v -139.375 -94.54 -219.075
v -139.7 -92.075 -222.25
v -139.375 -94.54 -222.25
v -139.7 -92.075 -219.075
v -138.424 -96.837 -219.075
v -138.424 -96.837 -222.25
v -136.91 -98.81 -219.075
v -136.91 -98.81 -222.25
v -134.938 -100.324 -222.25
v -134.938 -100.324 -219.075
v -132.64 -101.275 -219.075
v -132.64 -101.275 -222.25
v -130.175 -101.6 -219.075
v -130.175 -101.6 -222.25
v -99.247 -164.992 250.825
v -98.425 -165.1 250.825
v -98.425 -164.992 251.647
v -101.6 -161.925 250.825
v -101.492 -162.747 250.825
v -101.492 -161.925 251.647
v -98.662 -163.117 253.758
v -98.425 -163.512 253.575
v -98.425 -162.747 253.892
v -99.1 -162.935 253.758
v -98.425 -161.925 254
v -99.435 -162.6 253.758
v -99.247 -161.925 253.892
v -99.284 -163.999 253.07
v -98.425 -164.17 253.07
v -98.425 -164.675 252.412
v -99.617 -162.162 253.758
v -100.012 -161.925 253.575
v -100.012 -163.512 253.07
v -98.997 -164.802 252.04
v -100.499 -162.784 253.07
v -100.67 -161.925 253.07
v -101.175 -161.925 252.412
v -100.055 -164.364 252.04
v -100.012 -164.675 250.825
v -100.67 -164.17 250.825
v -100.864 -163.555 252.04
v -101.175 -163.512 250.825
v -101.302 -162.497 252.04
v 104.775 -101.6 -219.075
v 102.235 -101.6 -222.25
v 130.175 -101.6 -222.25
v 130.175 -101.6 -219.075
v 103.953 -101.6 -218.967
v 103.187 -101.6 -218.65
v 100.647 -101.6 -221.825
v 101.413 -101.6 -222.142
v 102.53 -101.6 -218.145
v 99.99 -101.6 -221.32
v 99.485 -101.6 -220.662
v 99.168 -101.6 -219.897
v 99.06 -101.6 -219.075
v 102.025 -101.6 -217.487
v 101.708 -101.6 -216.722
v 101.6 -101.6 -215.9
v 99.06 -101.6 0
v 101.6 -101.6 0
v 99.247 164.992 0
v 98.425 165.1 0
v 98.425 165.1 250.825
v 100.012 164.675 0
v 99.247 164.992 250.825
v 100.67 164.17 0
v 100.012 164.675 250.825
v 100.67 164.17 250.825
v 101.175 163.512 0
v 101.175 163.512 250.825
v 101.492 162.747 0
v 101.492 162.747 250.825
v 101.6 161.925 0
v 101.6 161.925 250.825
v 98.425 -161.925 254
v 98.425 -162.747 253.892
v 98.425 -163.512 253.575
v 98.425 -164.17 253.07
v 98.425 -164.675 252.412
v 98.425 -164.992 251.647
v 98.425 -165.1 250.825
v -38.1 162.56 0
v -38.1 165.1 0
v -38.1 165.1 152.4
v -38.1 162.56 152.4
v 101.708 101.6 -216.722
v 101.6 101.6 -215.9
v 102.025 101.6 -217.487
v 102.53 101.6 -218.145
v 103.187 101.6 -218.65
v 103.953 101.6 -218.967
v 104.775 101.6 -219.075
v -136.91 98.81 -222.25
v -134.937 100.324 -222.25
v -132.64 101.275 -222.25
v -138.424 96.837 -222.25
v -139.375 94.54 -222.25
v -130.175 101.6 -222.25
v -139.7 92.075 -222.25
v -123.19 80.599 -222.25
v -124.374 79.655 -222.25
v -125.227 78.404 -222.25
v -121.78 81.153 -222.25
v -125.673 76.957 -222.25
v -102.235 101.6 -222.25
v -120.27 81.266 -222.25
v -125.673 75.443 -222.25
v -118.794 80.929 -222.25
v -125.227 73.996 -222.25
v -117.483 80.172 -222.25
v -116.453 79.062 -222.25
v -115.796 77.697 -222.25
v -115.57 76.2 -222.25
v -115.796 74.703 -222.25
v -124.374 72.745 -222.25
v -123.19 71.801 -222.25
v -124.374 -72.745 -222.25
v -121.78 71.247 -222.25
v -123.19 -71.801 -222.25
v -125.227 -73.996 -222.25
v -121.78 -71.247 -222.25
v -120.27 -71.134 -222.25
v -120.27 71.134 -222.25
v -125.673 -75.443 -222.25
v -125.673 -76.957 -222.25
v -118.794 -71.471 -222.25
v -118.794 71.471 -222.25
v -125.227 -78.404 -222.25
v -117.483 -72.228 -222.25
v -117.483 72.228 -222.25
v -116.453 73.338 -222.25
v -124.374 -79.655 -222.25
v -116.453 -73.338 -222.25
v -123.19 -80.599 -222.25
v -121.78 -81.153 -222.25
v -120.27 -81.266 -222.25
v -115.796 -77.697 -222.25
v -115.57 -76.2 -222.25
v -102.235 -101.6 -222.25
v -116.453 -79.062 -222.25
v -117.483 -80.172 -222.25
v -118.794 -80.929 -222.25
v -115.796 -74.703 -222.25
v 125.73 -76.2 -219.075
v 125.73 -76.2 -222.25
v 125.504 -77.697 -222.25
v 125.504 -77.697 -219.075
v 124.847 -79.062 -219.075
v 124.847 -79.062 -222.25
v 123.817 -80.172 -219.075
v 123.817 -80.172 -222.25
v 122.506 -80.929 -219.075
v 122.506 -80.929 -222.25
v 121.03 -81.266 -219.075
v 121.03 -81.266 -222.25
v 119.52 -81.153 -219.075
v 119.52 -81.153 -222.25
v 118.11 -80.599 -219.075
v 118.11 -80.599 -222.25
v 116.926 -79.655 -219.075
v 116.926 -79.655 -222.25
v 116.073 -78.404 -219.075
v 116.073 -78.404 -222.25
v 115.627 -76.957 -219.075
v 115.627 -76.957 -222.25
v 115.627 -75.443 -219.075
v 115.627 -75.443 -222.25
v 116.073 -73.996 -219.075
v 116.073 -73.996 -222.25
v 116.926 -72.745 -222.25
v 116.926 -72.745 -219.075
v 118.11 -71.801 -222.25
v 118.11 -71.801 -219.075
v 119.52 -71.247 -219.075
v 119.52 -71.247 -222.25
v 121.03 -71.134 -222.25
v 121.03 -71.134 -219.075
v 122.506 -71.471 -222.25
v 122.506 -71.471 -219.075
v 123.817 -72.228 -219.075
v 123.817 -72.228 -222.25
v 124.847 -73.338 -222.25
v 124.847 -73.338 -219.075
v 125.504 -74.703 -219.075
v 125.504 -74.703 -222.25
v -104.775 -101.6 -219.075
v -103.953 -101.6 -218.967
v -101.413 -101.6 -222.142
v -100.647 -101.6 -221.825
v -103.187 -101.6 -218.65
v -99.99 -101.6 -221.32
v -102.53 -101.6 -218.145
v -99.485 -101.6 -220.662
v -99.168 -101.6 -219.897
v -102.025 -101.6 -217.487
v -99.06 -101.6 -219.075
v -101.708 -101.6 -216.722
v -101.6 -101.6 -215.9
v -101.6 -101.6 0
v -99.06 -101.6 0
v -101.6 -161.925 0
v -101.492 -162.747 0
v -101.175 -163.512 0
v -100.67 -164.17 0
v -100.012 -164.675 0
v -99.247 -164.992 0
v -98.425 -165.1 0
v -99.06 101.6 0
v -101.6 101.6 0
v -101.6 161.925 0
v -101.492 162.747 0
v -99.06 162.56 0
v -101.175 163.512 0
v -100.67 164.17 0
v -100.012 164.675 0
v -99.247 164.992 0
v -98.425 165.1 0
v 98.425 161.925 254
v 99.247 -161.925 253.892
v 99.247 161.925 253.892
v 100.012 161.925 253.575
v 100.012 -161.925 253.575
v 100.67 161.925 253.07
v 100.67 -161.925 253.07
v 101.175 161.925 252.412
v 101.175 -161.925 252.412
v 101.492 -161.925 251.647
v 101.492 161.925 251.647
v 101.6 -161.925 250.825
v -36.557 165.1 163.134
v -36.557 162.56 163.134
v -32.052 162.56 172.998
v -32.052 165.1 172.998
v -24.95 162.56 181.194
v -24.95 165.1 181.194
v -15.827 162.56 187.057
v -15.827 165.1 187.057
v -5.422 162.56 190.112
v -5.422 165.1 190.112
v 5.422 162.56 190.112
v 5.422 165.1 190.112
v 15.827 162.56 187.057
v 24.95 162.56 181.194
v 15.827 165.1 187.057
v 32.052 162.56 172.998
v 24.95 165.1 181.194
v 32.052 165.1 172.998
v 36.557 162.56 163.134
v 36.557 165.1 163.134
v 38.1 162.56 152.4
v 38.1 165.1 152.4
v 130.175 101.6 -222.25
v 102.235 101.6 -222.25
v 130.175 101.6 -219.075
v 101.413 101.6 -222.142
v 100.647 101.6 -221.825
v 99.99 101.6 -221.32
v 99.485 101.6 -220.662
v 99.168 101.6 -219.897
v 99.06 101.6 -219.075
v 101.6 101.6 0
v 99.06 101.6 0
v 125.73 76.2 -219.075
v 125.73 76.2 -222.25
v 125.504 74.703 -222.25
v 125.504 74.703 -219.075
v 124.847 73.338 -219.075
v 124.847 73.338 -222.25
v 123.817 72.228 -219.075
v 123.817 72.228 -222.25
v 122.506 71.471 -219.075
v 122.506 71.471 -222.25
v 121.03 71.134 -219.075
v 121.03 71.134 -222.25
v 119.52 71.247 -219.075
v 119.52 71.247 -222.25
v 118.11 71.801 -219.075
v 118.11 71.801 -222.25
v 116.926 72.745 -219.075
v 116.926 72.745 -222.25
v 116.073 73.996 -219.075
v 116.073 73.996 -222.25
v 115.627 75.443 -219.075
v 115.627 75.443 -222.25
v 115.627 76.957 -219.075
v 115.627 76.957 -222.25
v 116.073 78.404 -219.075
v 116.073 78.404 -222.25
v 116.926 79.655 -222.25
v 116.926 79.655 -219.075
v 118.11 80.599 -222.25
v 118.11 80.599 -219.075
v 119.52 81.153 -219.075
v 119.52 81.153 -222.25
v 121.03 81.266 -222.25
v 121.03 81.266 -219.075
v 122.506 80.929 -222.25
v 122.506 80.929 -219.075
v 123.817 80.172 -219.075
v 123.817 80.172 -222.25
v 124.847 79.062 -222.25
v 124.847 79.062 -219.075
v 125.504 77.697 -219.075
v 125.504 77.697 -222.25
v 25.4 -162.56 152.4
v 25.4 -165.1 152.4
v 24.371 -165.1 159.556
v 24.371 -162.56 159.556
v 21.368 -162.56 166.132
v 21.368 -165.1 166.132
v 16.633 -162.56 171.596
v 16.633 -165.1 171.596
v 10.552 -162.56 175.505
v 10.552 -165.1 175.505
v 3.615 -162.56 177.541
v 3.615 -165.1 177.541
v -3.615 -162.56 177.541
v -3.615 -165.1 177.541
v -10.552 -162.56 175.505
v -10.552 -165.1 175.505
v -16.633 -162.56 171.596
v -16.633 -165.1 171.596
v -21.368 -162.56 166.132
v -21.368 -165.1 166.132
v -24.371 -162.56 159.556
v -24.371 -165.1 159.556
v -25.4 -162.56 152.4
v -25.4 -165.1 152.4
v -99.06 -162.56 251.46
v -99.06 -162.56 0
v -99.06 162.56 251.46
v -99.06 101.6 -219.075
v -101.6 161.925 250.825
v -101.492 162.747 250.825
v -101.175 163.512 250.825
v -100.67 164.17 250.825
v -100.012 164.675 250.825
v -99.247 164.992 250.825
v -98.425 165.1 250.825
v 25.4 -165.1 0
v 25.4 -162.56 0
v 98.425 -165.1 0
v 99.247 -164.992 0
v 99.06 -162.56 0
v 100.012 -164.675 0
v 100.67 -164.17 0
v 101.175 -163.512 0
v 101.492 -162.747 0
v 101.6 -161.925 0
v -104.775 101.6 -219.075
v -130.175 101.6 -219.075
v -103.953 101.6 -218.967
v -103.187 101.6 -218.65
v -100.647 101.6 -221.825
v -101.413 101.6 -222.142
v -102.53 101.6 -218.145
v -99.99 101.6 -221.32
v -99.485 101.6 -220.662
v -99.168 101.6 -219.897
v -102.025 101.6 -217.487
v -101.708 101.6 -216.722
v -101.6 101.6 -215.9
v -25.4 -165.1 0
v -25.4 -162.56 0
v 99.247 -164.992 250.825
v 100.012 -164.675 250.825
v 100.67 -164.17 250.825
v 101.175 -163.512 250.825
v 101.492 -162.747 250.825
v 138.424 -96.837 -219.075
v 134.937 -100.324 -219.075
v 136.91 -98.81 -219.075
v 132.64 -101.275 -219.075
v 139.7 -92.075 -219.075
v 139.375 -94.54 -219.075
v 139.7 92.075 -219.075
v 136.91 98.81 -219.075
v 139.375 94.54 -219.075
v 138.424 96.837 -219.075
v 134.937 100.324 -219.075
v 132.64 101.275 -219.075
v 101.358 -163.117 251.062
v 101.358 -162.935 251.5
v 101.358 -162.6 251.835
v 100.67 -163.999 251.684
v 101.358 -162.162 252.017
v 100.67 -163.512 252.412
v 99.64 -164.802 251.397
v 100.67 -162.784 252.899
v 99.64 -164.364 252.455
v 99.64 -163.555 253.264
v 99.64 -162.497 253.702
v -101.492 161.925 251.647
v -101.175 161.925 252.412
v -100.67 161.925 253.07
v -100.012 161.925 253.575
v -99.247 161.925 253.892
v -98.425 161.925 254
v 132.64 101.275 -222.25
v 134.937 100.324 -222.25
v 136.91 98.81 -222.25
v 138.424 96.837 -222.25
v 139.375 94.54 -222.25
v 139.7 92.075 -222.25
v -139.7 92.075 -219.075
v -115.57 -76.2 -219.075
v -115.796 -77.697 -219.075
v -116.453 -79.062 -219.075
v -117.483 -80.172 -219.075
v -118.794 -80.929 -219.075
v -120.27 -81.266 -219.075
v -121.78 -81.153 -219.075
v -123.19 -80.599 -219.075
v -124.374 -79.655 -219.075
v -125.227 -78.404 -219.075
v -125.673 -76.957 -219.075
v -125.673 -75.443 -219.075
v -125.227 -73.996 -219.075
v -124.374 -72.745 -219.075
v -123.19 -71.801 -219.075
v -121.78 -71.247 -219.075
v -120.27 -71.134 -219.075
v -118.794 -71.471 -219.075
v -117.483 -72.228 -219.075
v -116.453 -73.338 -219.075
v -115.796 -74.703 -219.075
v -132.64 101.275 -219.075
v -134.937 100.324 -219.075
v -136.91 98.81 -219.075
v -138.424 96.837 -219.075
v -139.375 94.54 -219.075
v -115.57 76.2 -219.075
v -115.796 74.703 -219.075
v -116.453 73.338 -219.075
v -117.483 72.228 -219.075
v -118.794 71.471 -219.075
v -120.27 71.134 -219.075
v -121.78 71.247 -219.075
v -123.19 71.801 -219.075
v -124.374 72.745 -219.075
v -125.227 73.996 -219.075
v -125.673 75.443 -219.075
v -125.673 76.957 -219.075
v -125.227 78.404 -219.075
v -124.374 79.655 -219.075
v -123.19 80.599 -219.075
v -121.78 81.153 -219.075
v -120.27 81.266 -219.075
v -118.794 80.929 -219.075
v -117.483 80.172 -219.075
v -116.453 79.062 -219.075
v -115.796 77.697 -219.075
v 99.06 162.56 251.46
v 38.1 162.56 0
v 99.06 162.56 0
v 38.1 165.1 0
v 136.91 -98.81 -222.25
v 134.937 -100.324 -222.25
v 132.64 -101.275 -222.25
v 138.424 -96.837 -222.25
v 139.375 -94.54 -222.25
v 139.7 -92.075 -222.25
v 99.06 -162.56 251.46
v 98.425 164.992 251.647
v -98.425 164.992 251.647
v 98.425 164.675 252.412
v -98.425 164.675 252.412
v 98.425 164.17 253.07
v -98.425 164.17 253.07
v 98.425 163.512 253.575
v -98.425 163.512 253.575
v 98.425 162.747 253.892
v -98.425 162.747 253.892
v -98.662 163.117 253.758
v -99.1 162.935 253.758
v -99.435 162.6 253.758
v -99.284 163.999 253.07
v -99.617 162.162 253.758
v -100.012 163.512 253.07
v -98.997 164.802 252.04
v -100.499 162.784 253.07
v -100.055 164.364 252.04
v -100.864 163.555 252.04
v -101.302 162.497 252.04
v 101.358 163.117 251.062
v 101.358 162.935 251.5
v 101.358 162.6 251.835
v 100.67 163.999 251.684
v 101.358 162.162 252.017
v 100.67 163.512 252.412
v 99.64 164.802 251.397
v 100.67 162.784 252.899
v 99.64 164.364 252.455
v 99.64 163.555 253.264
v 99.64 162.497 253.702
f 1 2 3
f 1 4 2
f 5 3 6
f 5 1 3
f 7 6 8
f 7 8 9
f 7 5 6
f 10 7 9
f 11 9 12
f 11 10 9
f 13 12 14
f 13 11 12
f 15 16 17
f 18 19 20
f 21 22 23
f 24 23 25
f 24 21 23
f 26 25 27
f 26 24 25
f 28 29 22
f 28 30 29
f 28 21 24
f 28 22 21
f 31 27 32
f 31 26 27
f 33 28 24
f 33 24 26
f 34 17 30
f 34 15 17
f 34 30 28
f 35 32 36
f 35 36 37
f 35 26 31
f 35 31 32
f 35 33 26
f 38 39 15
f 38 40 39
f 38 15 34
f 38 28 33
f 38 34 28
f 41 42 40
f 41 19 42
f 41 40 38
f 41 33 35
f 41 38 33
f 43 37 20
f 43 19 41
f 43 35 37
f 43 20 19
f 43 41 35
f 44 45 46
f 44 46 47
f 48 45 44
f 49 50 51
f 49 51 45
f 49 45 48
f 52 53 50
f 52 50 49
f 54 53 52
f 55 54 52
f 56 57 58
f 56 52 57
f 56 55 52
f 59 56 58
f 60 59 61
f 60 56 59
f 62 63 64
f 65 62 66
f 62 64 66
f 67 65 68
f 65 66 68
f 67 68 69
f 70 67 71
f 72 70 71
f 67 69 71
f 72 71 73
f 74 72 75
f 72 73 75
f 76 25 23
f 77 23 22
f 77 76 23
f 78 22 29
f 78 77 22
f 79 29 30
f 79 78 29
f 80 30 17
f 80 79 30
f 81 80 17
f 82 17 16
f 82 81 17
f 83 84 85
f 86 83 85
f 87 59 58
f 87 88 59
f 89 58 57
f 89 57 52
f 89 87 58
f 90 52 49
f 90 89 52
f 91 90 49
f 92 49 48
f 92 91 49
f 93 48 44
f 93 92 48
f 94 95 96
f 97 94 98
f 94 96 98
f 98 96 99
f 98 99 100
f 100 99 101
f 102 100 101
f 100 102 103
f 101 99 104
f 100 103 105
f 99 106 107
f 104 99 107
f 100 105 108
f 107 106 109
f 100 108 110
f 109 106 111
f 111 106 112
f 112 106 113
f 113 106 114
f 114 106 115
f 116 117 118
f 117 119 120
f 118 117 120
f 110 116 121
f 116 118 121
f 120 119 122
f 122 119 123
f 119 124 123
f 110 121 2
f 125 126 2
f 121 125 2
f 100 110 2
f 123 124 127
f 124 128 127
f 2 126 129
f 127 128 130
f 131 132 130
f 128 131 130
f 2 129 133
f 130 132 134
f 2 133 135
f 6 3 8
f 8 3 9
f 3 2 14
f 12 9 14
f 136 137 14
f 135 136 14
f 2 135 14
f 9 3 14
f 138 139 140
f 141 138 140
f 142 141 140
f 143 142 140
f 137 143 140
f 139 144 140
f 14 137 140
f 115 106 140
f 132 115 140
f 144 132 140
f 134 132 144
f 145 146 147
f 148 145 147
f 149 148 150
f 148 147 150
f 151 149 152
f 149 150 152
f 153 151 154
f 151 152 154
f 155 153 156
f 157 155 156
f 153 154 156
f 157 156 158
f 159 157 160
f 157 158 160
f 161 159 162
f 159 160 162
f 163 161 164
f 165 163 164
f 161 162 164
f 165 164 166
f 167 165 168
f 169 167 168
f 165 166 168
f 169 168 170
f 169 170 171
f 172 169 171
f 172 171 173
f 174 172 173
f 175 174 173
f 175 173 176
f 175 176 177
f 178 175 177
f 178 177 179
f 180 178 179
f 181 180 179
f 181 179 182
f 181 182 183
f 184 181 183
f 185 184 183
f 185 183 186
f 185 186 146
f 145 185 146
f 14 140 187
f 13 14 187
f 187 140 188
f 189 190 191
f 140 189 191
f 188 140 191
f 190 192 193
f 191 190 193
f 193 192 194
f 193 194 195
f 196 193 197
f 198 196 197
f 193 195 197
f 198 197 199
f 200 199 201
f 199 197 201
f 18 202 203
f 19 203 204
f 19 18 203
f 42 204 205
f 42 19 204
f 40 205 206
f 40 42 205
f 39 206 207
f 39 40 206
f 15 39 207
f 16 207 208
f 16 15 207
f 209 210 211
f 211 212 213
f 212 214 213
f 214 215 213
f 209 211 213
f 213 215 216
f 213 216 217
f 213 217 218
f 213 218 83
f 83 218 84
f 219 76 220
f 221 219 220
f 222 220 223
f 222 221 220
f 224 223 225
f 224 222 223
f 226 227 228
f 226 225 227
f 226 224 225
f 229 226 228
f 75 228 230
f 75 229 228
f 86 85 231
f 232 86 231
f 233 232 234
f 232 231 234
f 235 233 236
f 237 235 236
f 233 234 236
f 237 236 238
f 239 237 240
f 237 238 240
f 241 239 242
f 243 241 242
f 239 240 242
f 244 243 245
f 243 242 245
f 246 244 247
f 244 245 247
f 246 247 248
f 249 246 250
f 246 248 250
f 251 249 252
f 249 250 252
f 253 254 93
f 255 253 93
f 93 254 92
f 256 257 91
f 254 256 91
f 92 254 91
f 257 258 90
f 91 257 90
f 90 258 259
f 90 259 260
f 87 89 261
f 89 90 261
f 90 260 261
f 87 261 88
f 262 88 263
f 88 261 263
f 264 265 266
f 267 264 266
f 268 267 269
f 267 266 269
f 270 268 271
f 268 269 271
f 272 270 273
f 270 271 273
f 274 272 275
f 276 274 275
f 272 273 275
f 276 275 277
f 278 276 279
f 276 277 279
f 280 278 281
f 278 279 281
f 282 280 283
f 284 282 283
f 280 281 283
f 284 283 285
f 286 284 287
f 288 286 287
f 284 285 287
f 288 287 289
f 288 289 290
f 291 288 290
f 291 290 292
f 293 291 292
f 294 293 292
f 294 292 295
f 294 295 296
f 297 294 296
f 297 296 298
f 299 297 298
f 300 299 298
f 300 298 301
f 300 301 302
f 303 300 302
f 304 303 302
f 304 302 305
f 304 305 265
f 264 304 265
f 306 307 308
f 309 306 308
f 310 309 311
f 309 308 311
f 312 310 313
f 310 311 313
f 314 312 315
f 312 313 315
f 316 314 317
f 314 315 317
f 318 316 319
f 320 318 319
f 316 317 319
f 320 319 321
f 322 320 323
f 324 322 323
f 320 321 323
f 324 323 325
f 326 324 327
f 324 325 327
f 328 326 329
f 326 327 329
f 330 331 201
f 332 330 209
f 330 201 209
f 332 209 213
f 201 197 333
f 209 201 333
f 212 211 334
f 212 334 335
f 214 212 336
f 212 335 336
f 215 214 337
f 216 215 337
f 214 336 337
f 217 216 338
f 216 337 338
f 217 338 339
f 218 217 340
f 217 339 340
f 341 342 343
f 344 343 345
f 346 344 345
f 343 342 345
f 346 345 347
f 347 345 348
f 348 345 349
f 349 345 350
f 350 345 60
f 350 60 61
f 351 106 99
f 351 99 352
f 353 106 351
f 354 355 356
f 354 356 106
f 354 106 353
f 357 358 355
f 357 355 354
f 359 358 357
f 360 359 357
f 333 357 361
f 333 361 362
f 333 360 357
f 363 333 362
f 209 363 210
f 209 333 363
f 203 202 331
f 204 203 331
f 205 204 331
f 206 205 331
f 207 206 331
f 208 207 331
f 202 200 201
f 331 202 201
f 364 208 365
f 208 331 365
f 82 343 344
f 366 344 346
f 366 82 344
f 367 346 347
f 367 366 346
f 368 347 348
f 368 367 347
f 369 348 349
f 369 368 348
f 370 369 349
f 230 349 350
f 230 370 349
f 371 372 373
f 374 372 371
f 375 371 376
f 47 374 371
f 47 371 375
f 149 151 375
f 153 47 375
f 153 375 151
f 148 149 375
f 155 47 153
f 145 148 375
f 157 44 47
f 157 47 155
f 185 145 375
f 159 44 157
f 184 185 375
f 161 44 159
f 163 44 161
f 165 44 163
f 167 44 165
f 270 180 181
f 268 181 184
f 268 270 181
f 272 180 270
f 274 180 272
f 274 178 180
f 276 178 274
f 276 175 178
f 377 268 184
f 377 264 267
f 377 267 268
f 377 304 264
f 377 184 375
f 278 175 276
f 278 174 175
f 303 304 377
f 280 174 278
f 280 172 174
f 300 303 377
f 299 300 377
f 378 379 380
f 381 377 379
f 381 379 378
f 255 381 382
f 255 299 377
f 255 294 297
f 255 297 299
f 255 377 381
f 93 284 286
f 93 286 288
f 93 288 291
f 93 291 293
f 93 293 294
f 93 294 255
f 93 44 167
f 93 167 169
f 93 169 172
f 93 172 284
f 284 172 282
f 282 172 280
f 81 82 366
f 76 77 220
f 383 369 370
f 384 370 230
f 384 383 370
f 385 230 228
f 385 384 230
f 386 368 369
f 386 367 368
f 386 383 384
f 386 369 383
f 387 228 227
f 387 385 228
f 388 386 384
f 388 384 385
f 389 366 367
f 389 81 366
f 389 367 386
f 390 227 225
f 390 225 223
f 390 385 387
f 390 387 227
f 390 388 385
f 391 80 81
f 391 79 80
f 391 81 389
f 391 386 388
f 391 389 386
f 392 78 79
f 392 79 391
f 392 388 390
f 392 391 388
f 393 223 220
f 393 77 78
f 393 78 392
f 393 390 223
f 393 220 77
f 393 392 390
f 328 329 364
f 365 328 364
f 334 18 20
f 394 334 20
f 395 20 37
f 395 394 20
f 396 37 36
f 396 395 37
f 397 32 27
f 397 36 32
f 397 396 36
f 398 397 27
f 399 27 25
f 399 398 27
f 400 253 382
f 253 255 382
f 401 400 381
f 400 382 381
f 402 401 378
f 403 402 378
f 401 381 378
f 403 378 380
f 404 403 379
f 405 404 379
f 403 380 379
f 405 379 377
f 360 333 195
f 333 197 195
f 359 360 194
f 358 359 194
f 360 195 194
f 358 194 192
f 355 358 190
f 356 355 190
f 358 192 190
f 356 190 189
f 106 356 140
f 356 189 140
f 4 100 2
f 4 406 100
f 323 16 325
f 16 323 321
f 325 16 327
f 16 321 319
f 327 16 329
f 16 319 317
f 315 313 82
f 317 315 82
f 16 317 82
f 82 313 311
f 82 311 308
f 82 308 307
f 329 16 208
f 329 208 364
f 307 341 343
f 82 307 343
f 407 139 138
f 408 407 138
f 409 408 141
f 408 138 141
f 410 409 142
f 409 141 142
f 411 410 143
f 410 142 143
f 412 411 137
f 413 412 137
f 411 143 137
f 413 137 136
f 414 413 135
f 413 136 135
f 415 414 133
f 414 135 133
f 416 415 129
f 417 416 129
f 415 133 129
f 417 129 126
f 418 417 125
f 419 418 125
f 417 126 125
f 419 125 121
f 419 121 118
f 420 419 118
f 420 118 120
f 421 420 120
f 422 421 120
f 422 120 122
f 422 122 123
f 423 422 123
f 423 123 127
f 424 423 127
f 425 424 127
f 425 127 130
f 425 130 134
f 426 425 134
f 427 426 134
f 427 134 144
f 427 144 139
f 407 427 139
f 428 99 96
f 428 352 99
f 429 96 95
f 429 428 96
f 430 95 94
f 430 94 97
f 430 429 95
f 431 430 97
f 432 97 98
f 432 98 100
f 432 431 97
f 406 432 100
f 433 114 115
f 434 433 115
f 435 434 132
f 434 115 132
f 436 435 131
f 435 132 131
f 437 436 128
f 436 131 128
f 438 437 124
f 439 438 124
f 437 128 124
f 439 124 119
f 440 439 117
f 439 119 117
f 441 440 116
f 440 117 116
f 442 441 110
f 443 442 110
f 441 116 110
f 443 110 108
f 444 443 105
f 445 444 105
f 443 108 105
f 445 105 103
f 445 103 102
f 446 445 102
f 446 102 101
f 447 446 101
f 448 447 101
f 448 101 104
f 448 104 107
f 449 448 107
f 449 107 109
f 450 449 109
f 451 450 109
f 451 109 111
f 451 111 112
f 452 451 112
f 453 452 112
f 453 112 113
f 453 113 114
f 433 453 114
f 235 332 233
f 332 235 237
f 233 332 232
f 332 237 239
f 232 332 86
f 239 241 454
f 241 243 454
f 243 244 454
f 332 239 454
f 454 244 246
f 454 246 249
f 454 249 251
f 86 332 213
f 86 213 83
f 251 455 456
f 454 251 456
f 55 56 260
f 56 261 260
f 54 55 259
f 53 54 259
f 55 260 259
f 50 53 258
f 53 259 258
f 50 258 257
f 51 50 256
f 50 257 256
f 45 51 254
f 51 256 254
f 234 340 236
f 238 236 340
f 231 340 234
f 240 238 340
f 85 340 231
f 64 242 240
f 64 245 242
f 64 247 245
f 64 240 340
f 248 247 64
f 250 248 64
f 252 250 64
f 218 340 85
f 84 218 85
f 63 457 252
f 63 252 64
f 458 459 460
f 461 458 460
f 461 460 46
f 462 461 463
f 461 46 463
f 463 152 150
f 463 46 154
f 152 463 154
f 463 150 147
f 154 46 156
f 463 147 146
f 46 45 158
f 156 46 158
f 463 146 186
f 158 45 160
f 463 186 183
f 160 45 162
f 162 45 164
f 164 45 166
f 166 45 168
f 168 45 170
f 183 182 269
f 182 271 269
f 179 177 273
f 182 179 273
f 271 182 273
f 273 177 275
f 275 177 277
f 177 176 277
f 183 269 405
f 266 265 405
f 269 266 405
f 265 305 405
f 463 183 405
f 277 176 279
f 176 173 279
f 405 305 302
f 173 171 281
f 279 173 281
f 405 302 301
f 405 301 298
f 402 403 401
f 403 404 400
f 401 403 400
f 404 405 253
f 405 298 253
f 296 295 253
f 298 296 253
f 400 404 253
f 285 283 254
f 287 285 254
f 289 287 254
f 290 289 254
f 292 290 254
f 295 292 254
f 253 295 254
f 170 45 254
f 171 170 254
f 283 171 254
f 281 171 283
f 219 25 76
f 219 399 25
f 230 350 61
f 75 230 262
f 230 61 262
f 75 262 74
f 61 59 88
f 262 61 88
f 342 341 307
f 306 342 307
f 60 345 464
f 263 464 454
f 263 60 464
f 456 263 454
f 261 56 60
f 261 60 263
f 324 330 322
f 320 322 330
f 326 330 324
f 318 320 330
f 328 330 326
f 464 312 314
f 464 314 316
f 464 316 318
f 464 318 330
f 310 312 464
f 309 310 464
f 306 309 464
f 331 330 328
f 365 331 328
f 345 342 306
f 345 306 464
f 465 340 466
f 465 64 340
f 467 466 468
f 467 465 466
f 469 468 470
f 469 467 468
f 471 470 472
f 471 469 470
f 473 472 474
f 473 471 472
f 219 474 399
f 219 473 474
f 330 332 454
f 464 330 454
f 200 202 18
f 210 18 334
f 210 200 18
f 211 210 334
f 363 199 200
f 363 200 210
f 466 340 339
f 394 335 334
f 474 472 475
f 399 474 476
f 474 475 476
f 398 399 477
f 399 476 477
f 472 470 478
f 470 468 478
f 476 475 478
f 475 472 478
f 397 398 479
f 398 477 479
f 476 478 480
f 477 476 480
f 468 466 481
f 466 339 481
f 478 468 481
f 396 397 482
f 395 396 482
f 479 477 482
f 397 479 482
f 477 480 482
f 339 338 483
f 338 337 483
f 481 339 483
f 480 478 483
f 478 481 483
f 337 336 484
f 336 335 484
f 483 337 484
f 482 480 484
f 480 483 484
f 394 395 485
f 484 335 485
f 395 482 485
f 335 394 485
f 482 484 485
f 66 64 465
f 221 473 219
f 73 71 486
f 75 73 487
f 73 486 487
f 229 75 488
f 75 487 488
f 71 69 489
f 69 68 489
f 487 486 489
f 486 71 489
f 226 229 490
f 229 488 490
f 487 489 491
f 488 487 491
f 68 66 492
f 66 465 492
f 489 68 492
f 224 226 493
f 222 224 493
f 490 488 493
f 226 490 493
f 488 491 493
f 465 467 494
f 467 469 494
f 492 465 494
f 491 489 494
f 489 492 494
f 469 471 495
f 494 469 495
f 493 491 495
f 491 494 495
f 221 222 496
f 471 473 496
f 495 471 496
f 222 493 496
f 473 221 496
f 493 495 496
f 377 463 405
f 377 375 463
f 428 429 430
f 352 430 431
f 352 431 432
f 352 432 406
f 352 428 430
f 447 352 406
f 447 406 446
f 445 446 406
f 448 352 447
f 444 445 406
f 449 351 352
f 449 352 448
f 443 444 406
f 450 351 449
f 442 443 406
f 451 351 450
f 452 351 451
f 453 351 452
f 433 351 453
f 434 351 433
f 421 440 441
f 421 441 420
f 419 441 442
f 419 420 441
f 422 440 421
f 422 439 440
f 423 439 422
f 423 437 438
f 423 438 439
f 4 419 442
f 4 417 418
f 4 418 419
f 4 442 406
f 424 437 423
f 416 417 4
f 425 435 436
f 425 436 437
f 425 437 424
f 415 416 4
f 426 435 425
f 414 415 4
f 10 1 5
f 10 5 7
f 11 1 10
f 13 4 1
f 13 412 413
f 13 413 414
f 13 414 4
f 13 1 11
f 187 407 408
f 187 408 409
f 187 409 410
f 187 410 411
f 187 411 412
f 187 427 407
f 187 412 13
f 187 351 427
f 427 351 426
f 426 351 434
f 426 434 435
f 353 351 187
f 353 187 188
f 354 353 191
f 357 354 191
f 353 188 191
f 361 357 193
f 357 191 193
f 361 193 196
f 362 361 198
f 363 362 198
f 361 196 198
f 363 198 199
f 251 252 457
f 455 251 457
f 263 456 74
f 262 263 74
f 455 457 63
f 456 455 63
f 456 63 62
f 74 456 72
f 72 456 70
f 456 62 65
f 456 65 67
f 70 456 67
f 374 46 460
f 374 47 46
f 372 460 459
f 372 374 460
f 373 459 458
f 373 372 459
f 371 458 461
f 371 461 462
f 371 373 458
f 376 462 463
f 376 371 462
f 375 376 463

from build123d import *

# Parameters (mm, degrees)
F0_W      = 203.2
F0_H      = 330.2
F1_DEPTH  = 254
F2_T      = -2.54
F4_DEPTH  = 25.4
F6_DEPTH  = 25.4
F8_DEPTH  = 222.25
F10_DEPTH = 222.25
F11_W     = 203.2
F11_H     = 3.175
F12_DEPTH = 38.1
F13_W     = 203.2
F13_H     = 3.175
F14_DEPTH = 38.1
F15_R     = 5.08
F16_DEPTH = 25.4
F17_R     = 3.175
F18_R     = 9.525


with BuildPart() as f1:
    # F0 (on Top) → F1 (new body)
    with BuildSketch(Plane.XY):
        Rectangle(F0_W, F0_H)
    extrude(amount=F1_DEPTH)

    # F2
    f2_openings = [f1.faces().sort_by_distance(p)[0] for p in [
        (0, 0, 0),
    ]]
    offset(amount=F2_T, openings=f2_openings)

    # F3 (on face) → F4 (cut)
    with BuildSketch(Plane.XZ.offset(165.1)):
        with BuildLine():
            Line((-25.4, 0), (0, 0))
            Line((0, 0), (0, 127))
            ThreePointArc((0, 127), (-17.9605122421, 134.4394877579), (-25.4, 152.4))
            Line((-25.4, 152.4), (-25.4, 0))
        make_face()
        with BuildLine():
            Line((0, 127), (0, 0))
            Line((0, 0), (25.4, 0))
            Line((25.4, 0), (25.4, 152.4))
            ThreePointArc((25.4, 152.4), (17.9605122421, 134.4394877579), (0, 127))
        make_face()
        with BuildLine():
            ThreePointArc((-25.4, 152.4), (-17.9605122421, 134.4394877579), (0, 127))
            Line((0, 127), (0, 152.4))
            Line((0, 152.4), (-25.4, 152.4))
        make_face()
        with BuildLine():
            Line((0, 152.4), (0, 127))
            ThreePointArc((0, 127), (17.9605122421, 134.4394877579), (25.4, 152.4))
            Line((25.4, 152.4), (0, 152.4))
        make_face()
        with BuildLine():
            Line((-25.4, 152.4), (0, 152.4))
            Line((0, 152.4), (25.4, 152.4))
            ThreePointArc((25.4, 152.4), (0, 177.8), (-25.4, 152.4))
        make_face()
    extrude(amount=-F4_DEPTH, mode=Mode.SUBTRACT)

    # F5 (on face) → F6 (cut)
    with BuildSketch(Plane(origin=(0, 165.1, 0), x_dir=(-1, 0, 0), z_dir=(0, 1, 0))):
        with BuildLine():
            Line((-38.1, 0), (0, 0))
            Line((0, 0), (0, 114.3))
            ThreePointArc((0, 114.3), (-26.9407683632, 125.4592316368), (-38.1, 152.4))
            Line((-38.1, 152.4), (-38.1, 0))
        make_face()
        with BuildLine():
            Line((0, 114.3), (0, 0))
            Line((0, 0), (38.1, 0))
            Line((38.1, 0), (38.1, 152.4))
            ThreePointArc((38.1, 152.4), (26.9407683632, 125.4592316368), (0, 114.3))
        make_face()
        with BuildLine():
            ThreePointArc((-38.1, 152.4), (-26.9407683632, 125.4592316368), (0, 114.3))
            Line((0, 114.3), (0, 152.4))
            Line((0, 152.4), (-38.1, 152.4))
        make_face()
        with BuildLine():
            Line((0, 152.4), (0, 114.3))
            ThreePointArc((0, 114.3), (26.9407683632, 125.4592316368), (38.1, 152.4))
            Line((38.1, 152.4), (0, 152.4))
        make_face()
        with BuildLine():
            Line((-38.1, 152.4), (0, 152.4))
            Line((0, 152.4), (38.1, 152.4))
            ThreePointArc((38.1, 152.4), (0, 190.5), (-38.1, 152.4))
        make_face()
    extrude(amount=-F6_DEPTH, mode=Mode.SUBTRACT)

    # F7 (on face) → F8 (join)
    with BuildSketch(Plane(origin=(0, 0, 0), x_dir=(1, 0, 0), z_dir=(0, 0, -1))):
        Polygon((99.06, 101.6), (99.06, 0), (99.06, -101.6), (101.6, -101.6), (101.6, 101.6), align=None)
    extrude(amount=F8_DEPTH)

    # F9 (on face) → F10 (join)
    with BuildSketch(Plane(origin=(0, 0, 0), x_dir=(1, 0, 0), z_dir=(0, 0, -1))):
        Polygon((-99.06, -101.6), (-99.06, 0), (-99.06, 101.6), (-101.6, 101.6), (-101.6, -101.6), align=None)
    extrude(amount=F10_DEPTH)

    # F11 (on face) → F12 (join)
    with BuildSketch(Plane.YZ.offset(101.6)):
        with Locations((0, -220.6625)):
            Rectangle(F11_W, F11_H)
    extrude(amount=F12_DEPTH)

    # F13 (on face) → F14 (join)
    with BuildSketch(Plane(origin=(-101.6, 0, 0), x_dir=(0, -1, 0), z_dir=(-1, 0, 0))):
        with Locations((0, -220.6625)):
            Rectangle(F13_W, F13_H)
    extrude(amount=F14_DEPTH)

    # F15 (on face) → F16 (cut)
    with BuildSketch(Plane(origin=(0, 0, -222.25), x_dir=(1, 0, 0), z_dir=(0, 0, -1))):
        with Locations((120.65, 76.2)):
            Circle(F15_R)
        with Locations((120.65, -76.2)):
            Circle(F15_R)
        with Locations((-120.65, 76.2)):
            Circle(F15_R)
        with Locations((-120.65, -76.2)):
            Circle(F15_R)
    extrude(amount=-F16_DEPTH, mode=Mode.SUBTRACT)

    # F17
    f17_edges = [f1.edges().sort_by_distance(p)[0] for p in [
        (101.6, 0, -219.075),
        (99.06, 0, -222.25),
        (-99.06, 0, -222.25),
        (-101.6, 0, -219.075),
        (-101.6, -165.1, 127),
        (0, -165.1, 254),
        (101.6, -165.1, 127),
        (-101.6, 165.1, 127),
        (0, 165.1, 254),
        (101.6, 165.1, 127),
        (-101.6, 0, 254),
        (101.6, 0, 254),
    ]]
    fillet(f17_edges, radius=F17_R)

    # F18
    f18_edges = [f1.edges().sort_by_distance(p)[0] for p in [
        (-139.7, 101.6, -220.6625),
        (-139.7, -101.6, -220.6625),
        (139.7, -101.6, -220.6625),
        (139.7, 101.6, -220.6625),
    ]]
    fillet(f18_edges, radius=F18_R)


solid = f1.part
